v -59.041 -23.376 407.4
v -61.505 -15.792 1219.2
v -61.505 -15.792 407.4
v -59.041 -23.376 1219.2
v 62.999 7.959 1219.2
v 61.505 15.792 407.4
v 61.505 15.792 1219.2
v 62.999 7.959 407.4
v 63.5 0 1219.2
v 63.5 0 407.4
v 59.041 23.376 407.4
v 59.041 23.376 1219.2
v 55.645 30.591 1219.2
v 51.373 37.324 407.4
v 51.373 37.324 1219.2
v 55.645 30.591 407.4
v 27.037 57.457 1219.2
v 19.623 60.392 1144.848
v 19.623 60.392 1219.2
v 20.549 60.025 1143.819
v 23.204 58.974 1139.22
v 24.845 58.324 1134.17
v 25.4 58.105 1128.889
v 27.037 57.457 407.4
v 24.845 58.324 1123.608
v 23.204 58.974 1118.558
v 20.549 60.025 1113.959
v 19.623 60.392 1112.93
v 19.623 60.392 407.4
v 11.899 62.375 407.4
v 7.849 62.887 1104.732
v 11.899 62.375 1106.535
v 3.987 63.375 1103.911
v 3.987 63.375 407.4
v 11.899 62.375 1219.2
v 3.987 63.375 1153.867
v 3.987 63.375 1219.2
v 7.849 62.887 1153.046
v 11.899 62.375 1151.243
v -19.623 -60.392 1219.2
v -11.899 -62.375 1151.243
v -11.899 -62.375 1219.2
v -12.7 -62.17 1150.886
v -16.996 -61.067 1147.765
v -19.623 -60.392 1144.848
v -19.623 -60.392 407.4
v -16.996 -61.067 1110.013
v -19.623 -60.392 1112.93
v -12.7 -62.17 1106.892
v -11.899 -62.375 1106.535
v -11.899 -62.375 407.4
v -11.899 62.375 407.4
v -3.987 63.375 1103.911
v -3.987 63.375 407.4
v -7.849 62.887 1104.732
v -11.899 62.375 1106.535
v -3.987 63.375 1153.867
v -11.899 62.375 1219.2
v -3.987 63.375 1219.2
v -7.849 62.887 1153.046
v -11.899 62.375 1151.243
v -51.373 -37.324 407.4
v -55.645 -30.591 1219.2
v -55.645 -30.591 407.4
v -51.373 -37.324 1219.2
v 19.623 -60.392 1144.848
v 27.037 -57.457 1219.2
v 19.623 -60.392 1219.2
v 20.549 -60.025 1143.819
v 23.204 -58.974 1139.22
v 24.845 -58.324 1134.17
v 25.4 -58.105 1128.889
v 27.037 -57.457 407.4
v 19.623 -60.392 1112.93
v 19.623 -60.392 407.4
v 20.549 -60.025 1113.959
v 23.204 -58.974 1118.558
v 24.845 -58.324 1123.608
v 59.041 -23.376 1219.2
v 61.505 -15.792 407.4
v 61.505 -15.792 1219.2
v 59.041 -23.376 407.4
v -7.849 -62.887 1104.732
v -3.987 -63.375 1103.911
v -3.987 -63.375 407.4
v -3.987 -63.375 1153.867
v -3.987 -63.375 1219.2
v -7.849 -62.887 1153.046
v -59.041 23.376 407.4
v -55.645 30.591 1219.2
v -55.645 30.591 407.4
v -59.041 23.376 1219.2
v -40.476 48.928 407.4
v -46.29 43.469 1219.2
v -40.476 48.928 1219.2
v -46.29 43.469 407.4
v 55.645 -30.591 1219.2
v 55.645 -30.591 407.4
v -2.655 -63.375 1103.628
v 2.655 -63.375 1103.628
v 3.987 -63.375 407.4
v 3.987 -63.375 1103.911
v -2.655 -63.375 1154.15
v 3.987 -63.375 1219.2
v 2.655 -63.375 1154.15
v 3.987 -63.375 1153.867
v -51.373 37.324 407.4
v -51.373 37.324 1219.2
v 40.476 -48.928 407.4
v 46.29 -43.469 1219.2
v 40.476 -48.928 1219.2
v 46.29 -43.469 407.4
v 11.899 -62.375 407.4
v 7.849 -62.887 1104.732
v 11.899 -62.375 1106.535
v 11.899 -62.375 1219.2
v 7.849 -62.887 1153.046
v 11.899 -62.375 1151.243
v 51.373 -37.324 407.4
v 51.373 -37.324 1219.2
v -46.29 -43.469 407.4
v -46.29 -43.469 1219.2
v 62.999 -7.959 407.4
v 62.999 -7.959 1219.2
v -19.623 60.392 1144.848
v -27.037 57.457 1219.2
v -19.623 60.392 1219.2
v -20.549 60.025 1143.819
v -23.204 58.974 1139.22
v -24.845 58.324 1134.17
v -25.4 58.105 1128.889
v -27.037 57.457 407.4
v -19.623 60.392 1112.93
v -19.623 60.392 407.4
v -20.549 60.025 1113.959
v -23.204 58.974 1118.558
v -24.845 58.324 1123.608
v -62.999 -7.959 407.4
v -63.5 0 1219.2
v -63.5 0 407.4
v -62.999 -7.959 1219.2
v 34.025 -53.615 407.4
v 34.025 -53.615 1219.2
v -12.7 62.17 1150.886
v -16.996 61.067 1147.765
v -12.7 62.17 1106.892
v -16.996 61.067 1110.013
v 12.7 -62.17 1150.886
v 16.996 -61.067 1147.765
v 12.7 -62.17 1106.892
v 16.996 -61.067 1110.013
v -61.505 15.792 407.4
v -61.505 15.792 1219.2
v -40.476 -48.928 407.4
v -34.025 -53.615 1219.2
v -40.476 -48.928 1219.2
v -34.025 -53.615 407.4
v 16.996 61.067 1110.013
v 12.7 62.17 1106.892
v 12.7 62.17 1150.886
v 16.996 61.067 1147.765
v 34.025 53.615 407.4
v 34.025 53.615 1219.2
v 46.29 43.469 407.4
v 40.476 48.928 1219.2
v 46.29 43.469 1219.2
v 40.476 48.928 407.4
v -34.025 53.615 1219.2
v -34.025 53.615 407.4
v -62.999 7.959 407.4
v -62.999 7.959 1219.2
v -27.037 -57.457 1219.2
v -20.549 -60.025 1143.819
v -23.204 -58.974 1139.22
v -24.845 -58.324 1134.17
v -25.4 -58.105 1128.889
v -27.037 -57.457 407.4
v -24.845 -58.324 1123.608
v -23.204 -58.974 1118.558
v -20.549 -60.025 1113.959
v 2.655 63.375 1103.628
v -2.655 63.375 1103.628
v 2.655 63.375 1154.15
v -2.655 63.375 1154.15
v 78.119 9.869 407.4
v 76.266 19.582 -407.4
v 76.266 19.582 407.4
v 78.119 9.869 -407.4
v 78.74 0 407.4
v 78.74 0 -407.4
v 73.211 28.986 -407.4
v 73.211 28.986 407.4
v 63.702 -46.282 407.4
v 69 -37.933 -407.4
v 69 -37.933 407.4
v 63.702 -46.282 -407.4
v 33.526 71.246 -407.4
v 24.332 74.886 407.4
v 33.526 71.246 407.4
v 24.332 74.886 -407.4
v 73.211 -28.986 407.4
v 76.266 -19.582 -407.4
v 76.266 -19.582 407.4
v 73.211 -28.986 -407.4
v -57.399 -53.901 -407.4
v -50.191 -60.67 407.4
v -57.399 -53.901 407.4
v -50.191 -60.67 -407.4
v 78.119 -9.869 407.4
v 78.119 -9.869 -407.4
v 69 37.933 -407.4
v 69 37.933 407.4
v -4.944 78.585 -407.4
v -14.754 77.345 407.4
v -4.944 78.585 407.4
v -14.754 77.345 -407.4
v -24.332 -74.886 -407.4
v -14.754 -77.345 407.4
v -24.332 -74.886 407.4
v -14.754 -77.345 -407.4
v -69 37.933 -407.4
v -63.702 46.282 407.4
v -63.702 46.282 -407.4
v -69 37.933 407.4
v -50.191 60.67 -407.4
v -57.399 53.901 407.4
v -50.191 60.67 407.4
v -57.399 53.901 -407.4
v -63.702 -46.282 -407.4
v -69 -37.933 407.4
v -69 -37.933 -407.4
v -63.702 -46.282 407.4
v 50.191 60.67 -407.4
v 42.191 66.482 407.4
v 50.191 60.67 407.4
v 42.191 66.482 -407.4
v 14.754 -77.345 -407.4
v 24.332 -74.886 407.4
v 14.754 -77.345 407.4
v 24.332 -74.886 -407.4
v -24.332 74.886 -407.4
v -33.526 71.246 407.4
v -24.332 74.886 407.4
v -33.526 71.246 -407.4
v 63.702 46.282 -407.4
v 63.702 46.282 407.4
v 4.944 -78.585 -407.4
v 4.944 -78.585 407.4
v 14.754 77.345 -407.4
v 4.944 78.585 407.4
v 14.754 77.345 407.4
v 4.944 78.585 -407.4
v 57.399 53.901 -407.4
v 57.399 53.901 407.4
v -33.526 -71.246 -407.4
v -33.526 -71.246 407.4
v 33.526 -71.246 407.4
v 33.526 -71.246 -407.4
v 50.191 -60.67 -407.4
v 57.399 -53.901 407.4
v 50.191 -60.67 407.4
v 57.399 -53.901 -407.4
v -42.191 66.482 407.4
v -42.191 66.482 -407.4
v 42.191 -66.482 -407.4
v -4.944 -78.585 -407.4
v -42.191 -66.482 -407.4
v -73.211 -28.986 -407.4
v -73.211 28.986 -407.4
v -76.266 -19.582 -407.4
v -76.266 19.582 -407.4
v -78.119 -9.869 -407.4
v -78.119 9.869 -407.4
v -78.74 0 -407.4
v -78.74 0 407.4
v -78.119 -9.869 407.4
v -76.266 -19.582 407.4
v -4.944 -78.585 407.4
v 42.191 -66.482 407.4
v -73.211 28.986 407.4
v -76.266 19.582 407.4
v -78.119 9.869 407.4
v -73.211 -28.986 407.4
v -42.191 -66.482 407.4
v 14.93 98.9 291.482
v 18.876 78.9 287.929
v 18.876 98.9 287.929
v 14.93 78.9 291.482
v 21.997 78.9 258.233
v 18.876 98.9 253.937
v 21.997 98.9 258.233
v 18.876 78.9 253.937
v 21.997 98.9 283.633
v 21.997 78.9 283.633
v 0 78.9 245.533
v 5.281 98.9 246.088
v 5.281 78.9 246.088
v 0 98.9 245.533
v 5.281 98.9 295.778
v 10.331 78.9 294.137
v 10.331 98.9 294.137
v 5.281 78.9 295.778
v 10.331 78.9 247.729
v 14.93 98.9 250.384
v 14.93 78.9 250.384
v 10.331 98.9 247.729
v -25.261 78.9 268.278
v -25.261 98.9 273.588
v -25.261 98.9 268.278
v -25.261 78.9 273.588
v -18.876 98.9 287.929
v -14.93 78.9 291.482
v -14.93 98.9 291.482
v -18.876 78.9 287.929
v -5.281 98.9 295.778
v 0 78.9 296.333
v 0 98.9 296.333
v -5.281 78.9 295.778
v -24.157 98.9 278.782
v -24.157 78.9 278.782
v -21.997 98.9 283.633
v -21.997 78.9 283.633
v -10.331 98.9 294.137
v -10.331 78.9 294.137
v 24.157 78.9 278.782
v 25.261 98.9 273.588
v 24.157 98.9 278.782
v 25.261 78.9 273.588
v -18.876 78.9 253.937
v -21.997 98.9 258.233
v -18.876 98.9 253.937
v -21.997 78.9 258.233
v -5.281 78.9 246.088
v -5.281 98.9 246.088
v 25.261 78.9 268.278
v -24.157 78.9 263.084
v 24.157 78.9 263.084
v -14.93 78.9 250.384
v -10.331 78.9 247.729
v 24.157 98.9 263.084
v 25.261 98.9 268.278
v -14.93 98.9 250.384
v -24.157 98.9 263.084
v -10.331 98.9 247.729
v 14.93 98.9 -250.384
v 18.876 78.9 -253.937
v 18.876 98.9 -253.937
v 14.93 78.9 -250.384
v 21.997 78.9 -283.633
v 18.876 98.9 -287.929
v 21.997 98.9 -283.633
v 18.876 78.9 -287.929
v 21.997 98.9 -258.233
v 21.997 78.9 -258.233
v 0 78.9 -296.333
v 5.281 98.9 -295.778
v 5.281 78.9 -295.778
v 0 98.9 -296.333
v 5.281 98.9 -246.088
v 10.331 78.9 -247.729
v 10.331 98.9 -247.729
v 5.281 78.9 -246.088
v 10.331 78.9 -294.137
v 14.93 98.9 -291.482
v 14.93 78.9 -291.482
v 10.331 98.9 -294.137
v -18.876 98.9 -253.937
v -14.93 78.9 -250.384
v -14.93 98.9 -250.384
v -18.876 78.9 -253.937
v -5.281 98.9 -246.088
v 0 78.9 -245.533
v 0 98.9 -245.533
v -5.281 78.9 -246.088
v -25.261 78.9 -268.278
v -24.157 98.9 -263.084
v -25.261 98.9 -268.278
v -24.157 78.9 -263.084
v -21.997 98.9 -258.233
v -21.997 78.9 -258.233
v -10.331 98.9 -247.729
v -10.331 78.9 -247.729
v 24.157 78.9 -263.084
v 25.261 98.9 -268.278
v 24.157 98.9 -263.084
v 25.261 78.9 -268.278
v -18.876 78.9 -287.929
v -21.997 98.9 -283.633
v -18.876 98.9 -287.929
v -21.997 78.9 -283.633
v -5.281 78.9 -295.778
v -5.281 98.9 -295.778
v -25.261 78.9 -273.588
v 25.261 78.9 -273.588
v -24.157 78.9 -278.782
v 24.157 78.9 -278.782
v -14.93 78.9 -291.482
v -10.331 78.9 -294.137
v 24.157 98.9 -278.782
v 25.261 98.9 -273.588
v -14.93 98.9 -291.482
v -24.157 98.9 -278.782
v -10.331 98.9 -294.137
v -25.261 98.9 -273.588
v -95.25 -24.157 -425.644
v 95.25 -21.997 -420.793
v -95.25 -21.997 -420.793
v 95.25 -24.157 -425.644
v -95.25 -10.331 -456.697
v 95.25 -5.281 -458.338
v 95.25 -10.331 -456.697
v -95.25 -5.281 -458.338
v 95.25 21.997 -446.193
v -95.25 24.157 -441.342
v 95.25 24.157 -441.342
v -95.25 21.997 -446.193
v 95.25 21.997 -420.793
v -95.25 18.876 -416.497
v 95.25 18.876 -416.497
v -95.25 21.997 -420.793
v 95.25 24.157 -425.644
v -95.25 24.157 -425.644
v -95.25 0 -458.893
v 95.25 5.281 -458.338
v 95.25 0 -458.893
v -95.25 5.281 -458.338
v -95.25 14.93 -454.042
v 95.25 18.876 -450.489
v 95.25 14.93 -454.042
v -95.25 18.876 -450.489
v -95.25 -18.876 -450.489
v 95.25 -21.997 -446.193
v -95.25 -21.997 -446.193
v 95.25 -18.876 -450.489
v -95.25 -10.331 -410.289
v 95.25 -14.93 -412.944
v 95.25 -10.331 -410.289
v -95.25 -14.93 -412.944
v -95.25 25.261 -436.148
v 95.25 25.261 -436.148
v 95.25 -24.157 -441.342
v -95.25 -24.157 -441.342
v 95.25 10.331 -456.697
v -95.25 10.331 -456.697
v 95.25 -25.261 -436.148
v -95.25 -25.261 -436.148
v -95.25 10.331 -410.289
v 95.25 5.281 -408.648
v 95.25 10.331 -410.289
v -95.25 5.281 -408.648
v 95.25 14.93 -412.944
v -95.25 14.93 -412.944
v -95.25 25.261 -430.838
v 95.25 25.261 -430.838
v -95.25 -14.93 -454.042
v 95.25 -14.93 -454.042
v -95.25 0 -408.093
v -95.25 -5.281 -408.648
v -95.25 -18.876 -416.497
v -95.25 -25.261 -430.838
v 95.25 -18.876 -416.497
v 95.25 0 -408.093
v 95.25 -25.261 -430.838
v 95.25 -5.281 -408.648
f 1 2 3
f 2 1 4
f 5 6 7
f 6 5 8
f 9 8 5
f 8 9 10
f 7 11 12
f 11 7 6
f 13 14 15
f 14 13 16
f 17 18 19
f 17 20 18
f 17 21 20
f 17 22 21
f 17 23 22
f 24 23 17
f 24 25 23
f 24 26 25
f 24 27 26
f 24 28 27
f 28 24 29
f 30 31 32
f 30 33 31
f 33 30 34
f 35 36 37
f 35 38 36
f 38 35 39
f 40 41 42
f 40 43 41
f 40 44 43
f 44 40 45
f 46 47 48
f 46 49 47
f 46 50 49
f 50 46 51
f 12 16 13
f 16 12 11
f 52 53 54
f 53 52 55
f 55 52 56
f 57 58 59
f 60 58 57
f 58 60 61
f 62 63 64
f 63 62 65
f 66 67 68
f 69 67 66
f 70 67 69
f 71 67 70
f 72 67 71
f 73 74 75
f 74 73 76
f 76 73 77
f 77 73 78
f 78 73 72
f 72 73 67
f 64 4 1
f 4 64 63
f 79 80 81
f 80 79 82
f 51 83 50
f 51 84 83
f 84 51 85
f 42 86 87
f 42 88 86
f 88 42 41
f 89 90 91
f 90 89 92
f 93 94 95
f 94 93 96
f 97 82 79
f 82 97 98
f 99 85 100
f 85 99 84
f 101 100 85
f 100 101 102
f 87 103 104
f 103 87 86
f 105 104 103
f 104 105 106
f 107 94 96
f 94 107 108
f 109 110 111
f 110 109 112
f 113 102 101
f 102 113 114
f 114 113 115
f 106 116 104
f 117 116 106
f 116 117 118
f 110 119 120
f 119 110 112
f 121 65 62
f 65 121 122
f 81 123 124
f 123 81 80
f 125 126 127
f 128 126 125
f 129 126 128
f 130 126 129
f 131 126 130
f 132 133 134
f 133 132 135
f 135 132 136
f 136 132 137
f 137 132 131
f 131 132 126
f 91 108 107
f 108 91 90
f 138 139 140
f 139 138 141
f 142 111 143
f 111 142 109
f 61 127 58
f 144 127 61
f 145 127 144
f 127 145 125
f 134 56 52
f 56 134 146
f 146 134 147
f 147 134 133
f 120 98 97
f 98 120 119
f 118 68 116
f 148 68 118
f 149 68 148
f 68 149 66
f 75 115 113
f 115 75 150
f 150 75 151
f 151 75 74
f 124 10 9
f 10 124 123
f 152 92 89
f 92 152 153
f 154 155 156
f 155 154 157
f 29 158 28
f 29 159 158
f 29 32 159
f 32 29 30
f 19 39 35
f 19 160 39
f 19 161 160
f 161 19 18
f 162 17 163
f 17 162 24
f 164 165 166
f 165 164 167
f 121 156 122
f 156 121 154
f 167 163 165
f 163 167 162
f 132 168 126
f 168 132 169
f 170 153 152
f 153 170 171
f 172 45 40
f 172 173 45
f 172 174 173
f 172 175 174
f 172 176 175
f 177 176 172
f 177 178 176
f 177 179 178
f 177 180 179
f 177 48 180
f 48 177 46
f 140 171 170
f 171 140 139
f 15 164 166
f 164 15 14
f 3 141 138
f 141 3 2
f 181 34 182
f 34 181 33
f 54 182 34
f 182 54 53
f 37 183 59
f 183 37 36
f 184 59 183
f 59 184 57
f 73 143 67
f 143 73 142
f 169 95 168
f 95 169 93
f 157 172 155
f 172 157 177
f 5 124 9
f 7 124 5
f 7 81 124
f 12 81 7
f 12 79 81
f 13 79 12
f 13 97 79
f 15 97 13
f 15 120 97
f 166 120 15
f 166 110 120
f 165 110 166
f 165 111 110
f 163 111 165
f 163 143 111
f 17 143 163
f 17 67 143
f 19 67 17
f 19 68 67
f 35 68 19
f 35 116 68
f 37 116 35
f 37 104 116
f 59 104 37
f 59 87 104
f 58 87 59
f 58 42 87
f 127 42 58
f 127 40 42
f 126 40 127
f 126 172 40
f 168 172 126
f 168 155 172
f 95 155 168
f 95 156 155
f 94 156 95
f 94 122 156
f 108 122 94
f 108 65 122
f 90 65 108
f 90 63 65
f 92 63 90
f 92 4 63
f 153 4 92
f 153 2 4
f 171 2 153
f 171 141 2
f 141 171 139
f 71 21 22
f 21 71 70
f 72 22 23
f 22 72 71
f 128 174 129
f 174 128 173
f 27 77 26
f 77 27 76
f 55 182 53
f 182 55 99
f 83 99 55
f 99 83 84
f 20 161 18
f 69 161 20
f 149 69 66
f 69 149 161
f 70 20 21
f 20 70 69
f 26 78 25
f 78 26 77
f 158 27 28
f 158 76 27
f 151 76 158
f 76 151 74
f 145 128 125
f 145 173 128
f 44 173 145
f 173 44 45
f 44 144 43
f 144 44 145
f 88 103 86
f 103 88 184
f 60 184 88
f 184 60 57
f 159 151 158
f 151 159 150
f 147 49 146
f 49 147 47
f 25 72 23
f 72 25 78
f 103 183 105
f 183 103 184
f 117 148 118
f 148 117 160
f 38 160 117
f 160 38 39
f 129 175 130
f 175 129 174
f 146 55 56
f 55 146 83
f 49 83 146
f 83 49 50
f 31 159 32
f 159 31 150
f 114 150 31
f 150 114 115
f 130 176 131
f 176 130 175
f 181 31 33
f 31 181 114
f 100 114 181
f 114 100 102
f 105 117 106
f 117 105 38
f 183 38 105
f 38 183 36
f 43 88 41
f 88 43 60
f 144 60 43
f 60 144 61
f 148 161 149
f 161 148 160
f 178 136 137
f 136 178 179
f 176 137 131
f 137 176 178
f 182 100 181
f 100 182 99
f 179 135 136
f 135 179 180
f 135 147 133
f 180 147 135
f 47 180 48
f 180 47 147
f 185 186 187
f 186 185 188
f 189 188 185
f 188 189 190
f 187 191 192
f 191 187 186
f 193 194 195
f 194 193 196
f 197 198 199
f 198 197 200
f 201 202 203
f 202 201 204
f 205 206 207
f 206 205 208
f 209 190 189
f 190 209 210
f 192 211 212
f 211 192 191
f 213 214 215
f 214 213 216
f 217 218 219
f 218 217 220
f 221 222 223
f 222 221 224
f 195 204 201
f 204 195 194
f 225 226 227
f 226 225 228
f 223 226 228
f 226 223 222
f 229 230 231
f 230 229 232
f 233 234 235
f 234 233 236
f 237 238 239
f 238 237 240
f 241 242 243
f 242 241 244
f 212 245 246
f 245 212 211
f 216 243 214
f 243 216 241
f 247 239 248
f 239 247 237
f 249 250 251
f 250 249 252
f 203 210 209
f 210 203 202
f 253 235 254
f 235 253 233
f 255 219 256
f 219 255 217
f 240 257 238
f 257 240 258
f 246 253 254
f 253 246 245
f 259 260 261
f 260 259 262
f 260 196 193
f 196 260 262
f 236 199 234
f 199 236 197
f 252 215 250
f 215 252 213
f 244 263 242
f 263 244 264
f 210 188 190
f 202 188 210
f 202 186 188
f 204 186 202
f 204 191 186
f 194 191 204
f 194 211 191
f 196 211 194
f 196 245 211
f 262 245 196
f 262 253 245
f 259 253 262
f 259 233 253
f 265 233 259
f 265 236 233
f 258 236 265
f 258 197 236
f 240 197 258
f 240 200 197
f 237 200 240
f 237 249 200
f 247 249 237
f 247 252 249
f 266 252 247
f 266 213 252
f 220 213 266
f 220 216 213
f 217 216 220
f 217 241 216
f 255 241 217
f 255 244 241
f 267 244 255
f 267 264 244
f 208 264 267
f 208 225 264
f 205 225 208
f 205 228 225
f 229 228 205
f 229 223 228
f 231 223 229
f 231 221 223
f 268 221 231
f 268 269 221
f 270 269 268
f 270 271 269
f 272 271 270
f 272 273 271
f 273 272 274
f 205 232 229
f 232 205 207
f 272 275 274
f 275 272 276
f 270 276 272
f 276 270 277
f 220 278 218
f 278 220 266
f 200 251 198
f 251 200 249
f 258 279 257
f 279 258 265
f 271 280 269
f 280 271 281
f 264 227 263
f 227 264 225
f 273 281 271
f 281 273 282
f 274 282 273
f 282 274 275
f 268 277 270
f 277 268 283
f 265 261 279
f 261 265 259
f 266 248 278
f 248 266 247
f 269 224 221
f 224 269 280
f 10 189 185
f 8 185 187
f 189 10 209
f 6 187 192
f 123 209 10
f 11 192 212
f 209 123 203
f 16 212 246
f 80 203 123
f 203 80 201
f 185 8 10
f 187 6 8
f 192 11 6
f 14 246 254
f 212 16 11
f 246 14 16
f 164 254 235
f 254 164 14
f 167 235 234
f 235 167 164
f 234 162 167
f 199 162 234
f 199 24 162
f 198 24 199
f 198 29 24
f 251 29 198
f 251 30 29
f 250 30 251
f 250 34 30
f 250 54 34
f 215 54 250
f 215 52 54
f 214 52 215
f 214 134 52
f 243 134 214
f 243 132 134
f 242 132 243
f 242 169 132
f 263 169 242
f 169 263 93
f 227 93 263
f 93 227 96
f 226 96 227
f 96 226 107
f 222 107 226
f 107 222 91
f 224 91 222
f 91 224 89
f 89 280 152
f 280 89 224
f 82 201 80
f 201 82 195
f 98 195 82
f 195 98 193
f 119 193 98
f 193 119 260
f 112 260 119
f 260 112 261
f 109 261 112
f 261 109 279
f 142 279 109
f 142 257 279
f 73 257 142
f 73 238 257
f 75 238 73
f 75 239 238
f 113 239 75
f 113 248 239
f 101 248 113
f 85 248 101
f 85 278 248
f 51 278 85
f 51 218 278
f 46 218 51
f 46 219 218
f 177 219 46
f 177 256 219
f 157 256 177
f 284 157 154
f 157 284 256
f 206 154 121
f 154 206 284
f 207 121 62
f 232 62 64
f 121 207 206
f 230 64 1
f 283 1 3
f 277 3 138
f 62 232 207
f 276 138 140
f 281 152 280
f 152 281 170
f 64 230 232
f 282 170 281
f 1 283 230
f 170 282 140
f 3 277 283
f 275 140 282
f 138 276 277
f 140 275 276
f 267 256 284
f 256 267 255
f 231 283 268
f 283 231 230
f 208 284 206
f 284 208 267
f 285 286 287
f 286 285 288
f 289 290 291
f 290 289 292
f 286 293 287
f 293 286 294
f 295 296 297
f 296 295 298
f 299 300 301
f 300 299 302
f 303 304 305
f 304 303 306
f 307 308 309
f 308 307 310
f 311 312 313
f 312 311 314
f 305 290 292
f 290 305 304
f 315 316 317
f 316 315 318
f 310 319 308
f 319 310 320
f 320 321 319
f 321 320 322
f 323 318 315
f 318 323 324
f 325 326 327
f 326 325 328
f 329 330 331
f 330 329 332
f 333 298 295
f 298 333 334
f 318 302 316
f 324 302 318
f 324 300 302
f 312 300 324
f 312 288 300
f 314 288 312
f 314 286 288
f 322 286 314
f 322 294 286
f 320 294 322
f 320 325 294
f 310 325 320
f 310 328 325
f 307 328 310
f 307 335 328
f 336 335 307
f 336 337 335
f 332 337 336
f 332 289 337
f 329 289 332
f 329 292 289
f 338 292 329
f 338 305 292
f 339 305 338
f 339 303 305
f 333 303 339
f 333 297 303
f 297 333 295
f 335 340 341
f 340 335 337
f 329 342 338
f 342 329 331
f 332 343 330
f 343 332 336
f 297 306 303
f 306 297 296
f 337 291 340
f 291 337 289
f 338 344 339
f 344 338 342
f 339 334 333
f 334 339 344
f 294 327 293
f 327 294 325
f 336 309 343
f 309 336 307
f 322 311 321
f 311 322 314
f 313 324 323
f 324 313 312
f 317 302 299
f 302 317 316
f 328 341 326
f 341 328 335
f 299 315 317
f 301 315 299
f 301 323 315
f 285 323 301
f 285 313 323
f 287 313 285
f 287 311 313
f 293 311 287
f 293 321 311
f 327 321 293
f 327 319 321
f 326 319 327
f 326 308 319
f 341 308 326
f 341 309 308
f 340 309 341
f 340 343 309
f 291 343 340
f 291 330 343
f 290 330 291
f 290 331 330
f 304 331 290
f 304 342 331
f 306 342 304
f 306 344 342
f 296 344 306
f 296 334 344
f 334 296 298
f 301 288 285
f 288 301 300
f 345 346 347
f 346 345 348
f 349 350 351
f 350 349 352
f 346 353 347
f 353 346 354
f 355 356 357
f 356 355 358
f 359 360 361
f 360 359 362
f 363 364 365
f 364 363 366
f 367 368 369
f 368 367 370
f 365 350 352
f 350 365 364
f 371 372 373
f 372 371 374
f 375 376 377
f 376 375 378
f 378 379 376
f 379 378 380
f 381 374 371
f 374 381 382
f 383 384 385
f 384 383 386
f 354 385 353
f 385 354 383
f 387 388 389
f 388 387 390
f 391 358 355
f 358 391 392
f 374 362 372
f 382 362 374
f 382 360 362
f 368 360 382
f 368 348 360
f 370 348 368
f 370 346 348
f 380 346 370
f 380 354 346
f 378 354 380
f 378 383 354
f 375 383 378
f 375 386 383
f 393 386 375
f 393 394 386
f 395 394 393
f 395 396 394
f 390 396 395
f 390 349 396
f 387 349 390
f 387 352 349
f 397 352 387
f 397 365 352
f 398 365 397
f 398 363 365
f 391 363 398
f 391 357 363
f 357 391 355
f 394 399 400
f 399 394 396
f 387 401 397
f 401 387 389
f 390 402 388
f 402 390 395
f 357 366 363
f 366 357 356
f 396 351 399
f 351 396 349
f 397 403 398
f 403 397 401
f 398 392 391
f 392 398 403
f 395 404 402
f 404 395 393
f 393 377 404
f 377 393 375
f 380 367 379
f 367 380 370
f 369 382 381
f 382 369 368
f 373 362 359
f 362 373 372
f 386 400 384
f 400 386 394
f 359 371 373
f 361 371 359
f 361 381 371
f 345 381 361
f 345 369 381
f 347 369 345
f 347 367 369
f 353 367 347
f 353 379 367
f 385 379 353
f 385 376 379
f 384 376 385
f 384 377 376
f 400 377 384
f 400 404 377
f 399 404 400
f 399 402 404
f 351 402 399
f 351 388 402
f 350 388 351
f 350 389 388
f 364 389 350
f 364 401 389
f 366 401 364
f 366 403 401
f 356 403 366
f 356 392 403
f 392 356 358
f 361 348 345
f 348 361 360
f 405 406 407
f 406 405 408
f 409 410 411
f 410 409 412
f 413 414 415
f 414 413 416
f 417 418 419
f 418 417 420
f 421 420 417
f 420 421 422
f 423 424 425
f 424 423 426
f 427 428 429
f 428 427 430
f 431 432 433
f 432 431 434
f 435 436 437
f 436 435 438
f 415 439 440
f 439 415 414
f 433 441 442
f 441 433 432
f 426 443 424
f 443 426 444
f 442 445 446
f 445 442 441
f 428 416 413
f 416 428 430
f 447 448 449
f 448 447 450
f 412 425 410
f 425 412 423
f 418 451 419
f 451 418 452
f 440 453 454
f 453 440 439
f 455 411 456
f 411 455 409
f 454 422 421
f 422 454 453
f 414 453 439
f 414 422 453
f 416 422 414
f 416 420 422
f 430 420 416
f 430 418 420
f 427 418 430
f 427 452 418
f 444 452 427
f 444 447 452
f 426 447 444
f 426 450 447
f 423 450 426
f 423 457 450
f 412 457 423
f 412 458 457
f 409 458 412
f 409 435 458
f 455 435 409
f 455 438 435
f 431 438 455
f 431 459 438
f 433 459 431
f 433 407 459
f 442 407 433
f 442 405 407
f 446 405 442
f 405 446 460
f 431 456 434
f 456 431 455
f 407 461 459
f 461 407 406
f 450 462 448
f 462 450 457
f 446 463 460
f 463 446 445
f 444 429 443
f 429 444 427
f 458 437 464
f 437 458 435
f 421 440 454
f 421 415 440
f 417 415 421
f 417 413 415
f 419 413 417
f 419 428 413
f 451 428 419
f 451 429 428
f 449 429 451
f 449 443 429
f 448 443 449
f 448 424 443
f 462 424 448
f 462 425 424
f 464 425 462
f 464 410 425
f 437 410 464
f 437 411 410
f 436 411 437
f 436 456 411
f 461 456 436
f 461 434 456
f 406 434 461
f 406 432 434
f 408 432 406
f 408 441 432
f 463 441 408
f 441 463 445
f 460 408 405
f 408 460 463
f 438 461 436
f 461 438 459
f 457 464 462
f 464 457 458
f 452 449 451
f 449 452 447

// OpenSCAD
/*
Hydraulic cylinder variables


*/

//cylinder(h=8, r1=2.5, r2=2.5 ,$fn=50, center=false);
in=25.4;

module hydraulic_cylinder(unit,stroke,bore,extended){
    stroke=stroke*unit;
    bore=bore*unit;
    
    module h_cylinder(){
        difference(){
        cylinder(h=stroke,r=bore,$fn=50, center=true);
        color("lime")
        rotate([90,0,0])
        translate([0,stroke/2-(stroke*1/9),0])
        cylinder(r=unit,h=bore*3,center=true);
        }
    }
 
    // extend
    if (extended == true){
    translate([0,0,stroke])h_cylinder(); 
    }
    //unextend
    else{
        h_cylinder();
        }
    // Outer body
        
    color("red")cylinder(r=bore+0.6*in,h=stroke+2,$fn=50,center=true);
    
    module h_connection(){ 
        translate([0,bore+unit,0])
        rotate([90,90,0])
        color("red")cylinder(r=unit,h=20,center=true);
        
        
        }
    translate([0,0,stroke/2-(stroke*1/6)])h_connection();
    translate([0,0,-(stroke/2-(stroke*1/6))])h_connection();
    
    translate([0,0,-(stroke/2+stroke*1/30)])
    color("blue")
    rotate([0,90,0])
    cylinder(r=unit, h=bore*3, center=true);
    
    }
    
hydraulic_cylinder(in,32,2.5,true);
